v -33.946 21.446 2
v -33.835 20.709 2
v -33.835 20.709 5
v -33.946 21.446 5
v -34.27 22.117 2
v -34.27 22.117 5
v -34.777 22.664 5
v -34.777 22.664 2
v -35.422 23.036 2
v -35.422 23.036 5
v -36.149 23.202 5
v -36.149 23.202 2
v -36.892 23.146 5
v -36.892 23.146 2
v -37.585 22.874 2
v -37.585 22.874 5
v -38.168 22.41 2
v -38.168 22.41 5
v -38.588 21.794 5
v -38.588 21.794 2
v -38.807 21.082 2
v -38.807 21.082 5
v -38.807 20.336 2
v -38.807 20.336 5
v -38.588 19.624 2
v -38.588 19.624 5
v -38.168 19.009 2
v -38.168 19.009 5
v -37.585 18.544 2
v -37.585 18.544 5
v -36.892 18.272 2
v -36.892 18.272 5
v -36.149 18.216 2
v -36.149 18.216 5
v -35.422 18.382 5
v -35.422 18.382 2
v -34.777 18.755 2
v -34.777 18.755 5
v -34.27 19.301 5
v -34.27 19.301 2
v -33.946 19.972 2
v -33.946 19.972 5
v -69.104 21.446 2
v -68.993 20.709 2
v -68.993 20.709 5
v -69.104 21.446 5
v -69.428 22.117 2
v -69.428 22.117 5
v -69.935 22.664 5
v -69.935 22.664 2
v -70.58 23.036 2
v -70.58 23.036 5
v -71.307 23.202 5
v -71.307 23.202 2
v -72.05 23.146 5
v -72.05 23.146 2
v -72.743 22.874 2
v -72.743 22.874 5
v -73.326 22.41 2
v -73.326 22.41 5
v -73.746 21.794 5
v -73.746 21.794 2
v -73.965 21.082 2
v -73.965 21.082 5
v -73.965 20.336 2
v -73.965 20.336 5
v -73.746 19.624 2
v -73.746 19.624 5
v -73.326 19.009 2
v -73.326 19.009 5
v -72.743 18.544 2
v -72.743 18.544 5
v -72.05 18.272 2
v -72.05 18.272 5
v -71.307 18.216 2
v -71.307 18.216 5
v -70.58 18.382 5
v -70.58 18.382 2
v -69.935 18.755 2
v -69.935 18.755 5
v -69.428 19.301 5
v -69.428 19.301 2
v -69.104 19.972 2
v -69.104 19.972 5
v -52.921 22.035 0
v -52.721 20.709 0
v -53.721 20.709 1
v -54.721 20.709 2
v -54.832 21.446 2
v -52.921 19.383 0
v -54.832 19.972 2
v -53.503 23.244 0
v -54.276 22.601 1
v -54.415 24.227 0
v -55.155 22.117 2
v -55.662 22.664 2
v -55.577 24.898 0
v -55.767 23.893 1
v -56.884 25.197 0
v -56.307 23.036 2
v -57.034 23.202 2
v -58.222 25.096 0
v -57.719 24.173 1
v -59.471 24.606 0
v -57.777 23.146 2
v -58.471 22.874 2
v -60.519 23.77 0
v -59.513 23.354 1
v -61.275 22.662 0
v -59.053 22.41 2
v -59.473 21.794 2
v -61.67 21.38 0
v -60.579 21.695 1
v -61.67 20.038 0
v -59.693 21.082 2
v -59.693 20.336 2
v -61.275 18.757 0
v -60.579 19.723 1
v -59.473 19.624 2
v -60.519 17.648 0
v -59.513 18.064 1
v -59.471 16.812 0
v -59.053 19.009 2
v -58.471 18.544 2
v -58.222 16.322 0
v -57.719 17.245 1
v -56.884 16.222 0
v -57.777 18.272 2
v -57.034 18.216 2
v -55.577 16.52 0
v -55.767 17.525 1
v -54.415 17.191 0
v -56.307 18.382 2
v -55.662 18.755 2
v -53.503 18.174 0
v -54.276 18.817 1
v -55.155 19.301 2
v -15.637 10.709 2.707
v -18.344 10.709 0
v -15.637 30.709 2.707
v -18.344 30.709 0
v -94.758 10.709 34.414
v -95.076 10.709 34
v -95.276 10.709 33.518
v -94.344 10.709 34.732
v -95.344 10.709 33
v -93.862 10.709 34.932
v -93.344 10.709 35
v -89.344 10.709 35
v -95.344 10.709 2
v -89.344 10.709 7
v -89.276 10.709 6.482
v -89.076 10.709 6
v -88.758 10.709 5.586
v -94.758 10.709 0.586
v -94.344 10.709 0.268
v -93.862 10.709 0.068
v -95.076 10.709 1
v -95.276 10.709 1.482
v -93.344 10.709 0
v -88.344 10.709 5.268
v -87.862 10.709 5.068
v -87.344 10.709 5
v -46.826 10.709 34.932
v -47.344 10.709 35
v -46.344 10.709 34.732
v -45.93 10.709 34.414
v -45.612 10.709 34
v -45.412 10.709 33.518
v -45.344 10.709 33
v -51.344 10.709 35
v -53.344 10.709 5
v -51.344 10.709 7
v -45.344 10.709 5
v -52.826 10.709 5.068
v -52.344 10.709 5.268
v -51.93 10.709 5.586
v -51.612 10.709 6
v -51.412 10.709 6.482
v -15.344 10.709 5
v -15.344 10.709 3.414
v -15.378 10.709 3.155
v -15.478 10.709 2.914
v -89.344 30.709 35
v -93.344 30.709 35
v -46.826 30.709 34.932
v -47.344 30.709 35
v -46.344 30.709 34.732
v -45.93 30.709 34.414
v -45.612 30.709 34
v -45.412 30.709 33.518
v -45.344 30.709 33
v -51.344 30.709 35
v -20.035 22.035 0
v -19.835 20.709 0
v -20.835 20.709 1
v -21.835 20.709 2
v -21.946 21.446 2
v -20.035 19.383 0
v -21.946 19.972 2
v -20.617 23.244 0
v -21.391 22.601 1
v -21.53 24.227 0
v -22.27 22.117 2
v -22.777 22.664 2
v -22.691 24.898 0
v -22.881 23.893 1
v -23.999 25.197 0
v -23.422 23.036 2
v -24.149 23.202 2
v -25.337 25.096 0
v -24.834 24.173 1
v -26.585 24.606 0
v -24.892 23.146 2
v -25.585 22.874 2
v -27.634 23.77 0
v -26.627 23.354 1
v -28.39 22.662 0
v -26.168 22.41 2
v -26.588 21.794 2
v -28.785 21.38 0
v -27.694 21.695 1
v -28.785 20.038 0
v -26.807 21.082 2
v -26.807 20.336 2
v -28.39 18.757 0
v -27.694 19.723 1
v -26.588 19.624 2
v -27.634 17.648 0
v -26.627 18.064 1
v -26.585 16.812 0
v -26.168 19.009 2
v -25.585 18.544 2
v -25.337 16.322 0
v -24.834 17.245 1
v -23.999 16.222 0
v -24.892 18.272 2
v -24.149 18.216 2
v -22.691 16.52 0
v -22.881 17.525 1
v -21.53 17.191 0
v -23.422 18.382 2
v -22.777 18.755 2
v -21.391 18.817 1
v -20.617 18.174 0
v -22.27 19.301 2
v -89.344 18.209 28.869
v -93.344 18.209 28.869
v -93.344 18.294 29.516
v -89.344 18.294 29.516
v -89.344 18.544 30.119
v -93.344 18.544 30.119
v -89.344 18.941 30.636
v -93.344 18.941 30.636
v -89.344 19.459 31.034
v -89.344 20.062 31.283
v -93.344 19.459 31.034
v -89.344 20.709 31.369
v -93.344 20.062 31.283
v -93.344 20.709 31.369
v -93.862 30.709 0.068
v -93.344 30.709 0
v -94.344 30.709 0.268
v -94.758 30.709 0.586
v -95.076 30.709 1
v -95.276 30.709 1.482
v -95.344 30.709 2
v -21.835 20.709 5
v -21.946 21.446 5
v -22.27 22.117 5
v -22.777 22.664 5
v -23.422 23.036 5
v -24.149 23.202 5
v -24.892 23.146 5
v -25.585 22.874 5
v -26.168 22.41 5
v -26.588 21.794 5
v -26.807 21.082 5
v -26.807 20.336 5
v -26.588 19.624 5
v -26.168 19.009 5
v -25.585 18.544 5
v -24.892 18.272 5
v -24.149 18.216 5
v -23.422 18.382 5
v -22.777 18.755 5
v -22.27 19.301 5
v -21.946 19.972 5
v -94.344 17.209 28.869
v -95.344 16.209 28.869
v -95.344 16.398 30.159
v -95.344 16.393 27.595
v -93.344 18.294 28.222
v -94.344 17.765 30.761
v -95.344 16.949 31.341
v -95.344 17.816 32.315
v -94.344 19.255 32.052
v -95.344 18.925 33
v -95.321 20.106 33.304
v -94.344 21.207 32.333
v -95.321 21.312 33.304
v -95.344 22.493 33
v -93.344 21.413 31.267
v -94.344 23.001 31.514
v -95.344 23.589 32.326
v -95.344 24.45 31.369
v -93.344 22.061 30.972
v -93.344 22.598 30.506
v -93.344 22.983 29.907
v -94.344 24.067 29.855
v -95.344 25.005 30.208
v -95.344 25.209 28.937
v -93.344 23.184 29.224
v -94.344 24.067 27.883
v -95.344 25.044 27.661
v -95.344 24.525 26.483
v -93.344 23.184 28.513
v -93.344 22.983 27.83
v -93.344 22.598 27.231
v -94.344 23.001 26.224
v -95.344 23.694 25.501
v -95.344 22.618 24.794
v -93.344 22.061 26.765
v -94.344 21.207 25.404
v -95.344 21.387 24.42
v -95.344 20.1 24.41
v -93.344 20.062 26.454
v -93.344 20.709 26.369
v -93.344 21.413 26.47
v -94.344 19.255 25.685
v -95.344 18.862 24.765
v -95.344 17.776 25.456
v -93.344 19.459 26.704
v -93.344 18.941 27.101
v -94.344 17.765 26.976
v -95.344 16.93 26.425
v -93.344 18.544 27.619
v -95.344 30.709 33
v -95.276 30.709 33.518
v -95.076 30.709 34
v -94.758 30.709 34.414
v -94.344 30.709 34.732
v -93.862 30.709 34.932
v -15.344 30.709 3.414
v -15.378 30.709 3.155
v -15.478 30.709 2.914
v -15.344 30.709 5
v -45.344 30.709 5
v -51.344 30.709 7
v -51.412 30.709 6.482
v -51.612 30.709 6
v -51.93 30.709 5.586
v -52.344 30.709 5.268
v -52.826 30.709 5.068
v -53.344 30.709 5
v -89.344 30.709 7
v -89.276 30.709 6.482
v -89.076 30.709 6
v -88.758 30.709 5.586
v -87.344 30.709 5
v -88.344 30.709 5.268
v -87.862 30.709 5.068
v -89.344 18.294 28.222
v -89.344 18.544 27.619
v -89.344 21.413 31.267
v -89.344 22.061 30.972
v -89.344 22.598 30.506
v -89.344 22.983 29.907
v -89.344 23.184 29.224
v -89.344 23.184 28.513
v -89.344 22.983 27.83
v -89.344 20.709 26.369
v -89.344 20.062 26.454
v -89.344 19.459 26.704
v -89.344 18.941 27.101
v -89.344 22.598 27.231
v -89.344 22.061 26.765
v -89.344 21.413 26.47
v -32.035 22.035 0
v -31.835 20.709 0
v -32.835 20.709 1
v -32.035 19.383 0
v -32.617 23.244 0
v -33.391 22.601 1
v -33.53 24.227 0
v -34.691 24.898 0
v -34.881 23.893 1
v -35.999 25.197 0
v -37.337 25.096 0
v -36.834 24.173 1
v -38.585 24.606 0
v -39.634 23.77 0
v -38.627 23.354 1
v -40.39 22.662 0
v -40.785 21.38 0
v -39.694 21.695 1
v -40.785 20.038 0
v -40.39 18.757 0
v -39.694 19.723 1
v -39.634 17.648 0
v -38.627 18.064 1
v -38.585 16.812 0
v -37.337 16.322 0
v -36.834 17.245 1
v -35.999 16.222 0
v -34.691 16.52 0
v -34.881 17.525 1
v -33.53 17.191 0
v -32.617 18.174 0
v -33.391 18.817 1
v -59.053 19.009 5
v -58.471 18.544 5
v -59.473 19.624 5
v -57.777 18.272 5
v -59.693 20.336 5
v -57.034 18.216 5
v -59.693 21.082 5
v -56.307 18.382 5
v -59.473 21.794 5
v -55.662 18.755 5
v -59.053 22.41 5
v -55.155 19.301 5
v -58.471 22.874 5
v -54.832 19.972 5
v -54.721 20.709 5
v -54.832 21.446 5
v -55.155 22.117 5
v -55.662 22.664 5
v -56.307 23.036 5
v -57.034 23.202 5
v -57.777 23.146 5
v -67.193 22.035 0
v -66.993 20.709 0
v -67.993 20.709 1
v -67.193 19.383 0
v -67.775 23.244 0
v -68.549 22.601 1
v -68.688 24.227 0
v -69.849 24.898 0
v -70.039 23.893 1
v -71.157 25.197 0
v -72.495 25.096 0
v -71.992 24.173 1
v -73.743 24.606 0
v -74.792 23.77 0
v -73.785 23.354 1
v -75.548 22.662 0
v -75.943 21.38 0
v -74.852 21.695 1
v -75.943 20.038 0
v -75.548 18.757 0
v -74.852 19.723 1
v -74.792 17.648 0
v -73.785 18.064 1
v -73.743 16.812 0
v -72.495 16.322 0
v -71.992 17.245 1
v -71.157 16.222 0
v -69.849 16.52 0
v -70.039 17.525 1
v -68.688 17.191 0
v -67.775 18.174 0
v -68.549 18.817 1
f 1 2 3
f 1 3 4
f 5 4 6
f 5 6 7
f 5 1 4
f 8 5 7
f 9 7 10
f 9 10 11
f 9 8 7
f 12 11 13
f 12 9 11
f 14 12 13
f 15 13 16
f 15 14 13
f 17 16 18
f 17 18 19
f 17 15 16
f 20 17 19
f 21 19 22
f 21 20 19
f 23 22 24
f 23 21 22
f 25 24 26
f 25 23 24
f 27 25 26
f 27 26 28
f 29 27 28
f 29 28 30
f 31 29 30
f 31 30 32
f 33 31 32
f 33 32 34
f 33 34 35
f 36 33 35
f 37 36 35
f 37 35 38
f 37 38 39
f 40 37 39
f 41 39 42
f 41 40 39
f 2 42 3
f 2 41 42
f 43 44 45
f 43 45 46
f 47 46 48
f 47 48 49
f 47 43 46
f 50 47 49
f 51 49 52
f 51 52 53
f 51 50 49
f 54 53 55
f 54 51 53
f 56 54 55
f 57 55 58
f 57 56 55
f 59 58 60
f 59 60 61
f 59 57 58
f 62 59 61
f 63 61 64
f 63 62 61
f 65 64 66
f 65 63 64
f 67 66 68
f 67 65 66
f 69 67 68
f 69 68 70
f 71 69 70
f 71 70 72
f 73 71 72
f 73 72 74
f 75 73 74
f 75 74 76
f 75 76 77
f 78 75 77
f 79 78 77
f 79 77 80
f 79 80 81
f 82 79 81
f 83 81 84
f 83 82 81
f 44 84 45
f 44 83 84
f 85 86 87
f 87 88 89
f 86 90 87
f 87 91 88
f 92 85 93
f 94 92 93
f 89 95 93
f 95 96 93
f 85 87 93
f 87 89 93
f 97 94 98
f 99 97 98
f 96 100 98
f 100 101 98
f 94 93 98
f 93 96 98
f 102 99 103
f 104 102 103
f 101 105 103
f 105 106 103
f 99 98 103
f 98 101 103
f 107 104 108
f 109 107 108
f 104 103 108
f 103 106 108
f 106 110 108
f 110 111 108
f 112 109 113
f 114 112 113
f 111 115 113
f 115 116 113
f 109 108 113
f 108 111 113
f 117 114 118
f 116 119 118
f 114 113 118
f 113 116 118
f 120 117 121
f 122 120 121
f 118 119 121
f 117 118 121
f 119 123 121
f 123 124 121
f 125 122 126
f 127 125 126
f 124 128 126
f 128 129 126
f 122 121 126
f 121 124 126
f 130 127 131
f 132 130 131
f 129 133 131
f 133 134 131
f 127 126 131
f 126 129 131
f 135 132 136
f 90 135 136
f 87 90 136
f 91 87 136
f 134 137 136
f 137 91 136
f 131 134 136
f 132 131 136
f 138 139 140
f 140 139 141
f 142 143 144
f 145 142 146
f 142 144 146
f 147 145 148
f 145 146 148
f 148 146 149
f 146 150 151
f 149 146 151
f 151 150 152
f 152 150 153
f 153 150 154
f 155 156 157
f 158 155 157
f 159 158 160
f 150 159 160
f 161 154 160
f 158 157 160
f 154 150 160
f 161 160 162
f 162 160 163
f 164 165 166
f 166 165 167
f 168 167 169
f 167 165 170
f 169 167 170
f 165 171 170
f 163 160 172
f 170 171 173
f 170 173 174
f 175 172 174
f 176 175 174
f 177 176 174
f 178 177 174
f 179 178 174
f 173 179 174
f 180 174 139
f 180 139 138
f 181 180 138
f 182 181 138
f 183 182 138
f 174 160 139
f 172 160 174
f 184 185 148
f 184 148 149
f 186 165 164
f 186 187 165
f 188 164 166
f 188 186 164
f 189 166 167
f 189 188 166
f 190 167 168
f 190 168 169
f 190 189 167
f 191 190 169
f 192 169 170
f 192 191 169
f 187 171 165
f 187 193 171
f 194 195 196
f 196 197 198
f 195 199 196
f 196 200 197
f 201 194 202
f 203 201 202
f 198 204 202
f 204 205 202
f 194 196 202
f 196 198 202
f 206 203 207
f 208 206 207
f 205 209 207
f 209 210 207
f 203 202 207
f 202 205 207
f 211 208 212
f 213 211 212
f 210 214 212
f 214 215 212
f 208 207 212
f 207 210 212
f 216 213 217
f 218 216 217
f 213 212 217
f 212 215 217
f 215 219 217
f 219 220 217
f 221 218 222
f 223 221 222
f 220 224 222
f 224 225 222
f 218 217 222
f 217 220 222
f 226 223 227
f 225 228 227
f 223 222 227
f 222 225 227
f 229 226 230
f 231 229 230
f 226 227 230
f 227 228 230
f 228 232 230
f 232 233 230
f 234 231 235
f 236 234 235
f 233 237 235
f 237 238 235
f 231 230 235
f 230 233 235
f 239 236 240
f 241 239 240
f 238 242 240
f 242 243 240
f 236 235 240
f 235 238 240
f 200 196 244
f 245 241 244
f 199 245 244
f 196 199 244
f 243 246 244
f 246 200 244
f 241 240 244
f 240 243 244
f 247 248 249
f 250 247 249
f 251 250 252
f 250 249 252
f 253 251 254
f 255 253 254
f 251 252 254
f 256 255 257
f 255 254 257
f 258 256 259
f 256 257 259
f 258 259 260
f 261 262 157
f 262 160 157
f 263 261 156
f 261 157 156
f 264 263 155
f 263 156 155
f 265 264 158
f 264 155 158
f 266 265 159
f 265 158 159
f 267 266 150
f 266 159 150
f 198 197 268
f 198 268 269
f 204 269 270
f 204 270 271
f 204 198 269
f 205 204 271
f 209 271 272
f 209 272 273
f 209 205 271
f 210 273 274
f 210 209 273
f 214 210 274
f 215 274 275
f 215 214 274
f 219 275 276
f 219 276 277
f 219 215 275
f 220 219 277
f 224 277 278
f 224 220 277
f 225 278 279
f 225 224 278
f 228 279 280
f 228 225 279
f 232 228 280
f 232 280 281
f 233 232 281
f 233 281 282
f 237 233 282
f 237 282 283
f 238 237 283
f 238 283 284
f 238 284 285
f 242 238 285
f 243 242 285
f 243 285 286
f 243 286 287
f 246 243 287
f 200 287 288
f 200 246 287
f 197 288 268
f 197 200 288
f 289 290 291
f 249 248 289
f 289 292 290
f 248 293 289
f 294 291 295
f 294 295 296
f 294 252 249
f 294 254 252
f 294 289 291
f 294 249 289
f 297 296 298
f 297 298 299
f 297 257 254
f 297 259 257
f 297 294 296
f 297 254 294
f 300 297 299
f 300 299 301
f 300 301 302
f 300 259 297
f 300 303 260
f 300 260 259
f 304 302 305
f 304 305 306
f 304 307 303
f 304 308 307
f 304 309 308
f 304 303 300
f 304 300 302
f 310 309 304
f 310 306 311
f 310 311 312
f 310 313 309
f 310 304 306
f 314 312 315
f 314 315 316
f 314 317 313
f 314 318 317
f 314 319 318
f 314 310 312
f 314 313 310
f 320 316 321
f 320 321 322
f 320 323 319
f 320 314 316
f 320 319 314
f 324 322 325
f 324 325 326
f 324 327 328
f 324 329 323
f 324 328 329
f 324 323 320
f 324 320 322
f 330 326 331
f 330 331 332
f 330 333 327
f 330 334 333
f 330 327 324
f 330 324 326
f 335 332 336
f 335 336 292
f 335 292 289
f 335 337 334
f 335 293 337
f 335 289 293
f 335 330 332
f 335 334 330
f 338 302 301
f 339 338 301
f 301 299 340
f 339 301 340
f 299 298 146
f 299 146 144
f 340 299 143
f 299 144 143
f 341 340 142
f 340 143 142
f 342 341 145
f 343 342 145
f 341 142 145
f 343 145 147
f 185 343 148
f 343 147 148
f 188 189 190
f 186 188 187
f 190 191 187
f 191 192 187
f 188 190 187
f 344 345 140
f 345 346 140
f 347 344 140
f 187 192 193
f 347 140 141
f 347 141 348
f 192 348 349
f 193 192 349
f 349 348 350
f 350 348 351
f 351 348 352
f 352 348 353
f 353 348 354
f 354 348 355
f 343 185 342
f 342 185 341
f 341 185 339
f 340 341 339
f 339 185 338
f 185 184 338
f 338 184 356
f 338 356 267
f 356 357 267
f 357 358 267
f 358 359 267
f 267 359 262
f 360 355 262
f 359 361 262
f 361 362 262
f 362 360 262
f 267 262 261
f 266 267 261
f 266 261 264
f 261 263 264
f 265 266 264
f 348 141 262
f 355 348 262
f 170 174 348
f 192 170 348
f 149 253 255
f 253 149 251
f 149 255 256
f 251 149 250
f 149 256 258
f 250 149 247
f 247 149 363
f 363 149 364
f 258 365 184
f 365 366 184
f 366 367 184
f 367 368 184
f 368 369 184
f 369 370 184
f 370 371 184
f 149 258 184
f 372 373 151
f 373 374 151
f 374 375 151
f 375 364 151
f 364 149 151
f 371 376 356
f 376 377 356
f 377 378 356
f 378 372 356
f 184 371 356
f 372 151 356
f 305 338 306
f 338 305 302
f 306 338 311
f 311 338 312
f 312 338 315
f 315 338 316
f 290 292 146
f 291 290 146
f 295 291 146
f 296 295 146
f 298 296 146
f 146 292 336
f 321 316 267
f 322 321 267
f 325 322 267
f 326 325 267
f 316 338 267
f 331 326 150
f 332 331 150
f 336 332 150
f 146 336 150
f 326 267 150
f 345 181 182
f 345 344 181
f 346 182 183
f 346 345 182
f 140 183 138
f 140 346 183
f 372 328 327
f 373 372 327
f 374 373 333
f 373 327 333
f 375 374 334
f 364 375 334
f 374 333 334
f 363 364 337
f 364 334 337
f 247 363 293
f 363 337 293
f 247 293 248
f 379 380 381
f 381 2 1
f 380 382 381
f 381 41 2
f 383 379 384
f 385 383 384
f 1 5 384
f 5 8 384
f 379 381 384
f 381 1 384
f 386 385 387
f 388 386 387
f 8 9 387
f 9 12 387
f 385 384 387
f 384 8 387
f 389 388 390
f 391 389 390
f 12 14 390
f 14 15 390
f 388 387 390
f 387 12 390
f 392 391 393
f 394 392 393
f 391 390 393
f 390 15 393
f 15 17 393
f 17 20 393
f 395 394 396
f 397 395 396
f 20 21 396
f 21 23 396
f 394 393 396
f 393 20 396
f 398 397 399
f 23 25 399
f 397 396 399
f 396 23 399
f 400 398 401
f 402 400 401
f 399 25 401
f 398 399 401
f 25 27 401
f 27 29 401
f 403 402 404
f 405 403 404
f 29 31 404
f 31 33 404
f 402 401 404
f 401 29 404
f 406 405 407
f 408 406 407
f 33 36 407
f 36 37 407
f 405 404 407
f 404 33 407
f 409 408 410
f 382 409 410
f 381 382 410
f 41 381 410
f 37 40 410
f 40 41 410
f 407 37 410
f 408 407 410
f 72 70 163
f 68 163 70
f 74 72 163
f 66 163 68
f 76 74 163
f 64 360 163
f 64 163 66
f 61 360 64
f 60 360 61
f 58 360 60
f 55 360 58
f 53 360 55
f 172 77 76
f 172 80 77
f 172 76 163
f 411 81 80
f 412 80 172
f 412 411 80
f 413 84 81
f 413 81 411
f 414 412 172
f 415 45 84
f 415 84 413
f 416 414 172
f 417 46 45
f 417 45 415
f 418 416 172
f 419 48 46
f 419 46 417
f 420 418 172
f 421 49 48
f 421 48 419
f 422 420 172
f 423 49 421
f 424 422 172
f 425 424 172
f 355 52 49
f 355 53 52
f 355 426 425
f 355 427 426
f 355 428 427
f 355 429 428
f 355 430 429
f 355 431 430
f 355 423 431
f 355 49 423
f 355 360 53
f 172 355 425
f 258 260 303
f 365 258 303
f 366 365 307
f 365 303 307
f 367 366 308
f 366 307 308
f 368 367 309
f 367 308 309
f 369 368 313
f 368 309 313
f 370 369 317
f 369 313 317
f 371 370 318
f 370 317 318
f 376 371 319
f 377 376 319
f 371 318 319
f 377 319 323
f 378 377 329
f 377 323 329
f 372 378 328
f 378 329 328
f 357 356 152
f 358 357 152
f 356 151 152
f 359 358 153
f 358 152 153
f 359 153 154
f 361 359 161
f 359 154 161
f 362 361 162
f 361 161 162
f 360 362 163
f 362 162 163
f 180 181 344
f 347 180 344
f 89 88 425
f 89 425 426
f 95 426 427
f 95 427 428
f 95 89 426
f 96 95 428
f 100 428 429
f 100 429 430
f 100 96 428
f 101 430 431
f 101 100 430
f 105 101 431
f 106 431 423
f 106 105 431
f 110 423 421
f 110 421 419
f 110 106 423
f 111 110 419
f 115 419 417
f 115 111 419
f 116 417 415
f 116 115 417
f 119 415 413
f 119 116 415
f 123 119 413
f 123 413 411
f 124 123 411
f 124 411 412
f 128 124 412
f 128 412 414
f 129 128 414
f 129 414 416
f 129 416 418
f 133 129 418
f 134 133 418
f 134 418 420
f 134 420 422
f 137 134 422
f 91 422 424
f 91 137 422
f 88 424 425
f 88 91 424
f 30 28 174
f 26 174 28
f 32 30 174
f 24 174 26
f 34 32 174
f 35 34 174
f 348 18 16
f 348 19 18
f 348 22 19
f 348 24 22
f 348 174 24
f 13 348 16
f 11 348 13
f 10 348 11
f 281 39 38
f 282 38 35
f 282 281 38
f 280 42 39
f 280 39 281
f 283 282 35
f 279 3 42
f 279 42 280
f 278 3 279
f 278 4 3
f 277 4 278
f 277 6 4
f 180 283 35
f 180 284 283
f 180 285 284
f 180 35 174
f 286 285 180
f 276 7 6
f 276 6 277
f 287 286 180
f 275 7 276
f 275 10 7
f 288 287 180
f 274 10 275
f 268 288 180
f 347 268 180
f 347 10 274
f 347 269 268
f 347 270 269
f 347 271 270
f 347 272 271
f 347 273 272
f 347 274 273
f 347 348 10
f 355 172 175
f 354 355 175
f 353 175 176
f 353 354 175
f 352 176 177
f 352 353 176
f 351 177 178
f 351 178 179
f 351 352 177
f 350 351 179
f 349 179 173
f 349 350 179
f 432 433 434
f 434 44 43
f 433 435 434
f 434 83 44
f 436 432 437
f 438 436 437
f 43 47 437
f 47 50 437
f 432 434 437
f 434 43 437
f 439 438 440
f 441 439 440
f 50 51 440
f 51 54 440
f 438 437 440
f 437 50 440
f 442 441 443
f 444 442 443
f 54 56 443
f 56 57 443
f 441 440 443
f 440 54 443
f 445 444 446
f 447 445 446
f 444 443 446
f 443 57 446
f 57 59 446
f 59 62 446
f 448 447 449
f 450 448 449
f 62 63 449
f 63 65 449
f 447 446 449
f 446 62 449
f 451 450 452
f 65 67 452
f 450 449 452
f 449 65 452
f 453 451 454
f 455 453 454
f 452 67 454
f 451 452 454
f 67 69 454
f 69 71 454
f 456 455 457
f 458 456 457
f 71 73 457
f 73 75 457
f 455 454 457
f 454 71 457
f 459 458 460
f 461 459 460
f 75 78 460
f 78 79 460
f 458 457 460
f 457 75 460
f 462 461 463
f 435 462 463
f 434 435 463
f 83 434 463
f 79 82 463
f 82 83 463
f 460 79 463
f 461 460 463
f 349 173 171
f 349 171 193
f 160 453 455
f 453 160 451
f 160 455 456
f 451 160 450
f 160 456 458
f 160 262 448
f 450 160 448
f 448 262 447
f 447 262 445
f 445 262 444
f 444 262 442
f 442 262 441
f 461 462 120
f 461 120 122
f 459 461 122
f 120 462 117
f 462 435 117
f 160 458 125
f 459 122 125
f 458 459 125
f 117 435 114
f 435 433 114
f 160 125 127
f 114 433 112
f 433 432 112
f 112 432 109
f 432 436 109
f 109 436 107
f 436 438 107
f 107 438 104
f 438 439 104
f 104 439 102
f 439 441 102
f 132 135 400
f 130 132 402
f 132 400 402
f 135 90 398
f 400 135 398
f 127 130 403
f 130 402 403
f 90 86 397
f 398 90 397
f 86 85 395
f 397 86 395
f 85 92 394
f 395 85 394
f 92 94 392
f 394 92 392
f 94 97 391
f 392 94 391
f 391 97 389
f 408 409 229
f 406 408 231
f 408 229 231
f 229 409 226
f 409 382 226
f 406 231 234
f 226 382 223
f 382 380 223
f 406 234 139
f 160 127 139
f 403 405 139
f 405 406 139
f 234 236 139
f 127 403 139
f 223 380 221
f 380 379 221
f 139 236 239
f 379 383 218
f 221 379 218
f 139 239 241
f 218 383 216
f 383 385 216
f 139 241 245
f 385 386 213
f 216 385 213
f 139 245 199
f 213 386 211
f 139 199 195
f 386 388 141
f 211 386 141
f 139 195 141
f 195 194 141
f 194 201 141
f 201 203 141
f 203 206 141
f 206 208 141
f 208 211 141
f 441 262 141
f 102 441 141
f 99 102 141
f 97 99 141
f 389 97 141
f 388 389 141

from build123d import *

# Parameters (mm, degrees)
F1_DEPTH = 35
F0_W     = 6
F0_H     = 20
F0_R     = 2.5
F0_W_2   = 30
F2_DEPTH = 5
F3_R     = 2
F4_SIZE  = 3
F5_R     = 1
F6_SIZE  = 2
F7_R     = 2
F9_DEPTH = 12.5


# Not quite as in the source:
# - a fillet or chamfer that OpenCascade refuses, or shapes differently, is made with other operations: its cross-section is extruded or revolved along the edge and cut away or added
# - a feature names something its author has since deleted; it is built from what else it names


with BuildPart() as f1:
    # F0 (on Top) → F1 (new body)
    with BuildSketch(Plane.XY):
        Polygon((-89.3438757165, 20.7090974661), (-89.3438757165, 30.7090974661), (-95.3438757165, 30.7090974661), (-95.3438757165, 10.7090974661), (-89.3438757165, 10.7090974661), align=None)
    extrude(amount=F1_DEPTH)



with BuildPart() as f1b:
    # F0 (on Top) → F1, piece 2 (new body)
    with BuildSketch(Plane.XY):
        with Locations((-48.3438757165, 20.7090974661)):
            Rectangle(F0_W, F0_H)
    extrude(amount=F1_DEPTH)


with BuildPart() as f1_1:
    add(f1.part)

    add(f1b.part)  # F2 merges F1b
    # F0 (on Top) → F2 (join)
    with BuildSketch(Plane.XY):
        Polygon((-51.3438757165, 30.7090974661), (-89.3438757165, 30.7090974661), (-89.3438757165, 20.7090974661), (-89.3438757165, 10.7090974661), (-51.3438757165, 10.7090974661), align=None)
        with Locations((-71.4934170246, 20.7090974661)):
            Circle(F0_R, mode=Mode.SUBTRACT)
        with Locations((-57.2206377983, 20.7090974661)):
            Circle(F0_R, mode=Mode.SUBTRACT)
        with Locations((-30.3438757165, 20.7090974661)):
            Rectangle(F0_W_2, F0_H)
        with Locations((-36.3354164958, 20.7090974661)):
            Circle(F0_R, mode=Mode.SUBTRACT)
        with Locations((-24.3354164958, 20.7090974661)):
            Circle(F0_R, mode=Mode.SUBTRACT)
    extrude(amount=F2_DEPTH)

    # F3
    f3_edges = [f1_1.edges().sort_by_distance(p)[0] for p in [
        (-89.343876, 20.709097, 5),
        (-51.343876, 20.709097, 5),
        (-45.343876, 20.709097, 35),
    ]]
    fillet(f3_edges, radius=F3_R)

    # F4
    f4_edges = [f1_1.edges().sort_by_distance(p)[0] for p in [
        (-15.343876, 20.709097, 0),
    ]]
    chamfer(f4_edges, length=F4_SIZE)

    # F5
    f5_edges = [f1_1.edges().sort_by_distance(p)[0] for p in [
        (-15.343876, 20.709097, 3),
    ]]
    fillet(f5_edges, radius=F5_R)

    # F6
    f6_edges = [f1_1.edges().sort_by_distance(p)[0] for p in [
        (-59.720638, 20.709097, 0),
        (-38.835416, 20.709097, 0),
        (-26.835416, 20.709097, 0),
        (-73.993417, 20.709097, 0),
    ]]
    chamfer(f6_edges, length=F6_SIZE)

    # F7
    f7_edges = [f1_1.edges().sort_by_distance(p)[0] for p in [
        (-95.343876, 20.709097, 35),
        (-95.343876, 20.709097, 0),
    ]]
    fillet(f7_edges, radius=F7_R)

    # F8 (on face) → F9 (cut, symmetric)
    with BuildSketch(Plane(origin=(-95.3438757165, 0, 0), x_dir=(0, -1, 0), z_dir=(-1, 0, 0))):
        with BuildLine():
            ThreePointArc((-18.2090974661, 28.8686309451), (-18.9413305132, 30.636397898), (-20.7090974661, 31.3686309451))
            Line((-20.7090974661, 31.3686309451), (-20.7090974661, 26.3686309451))
            ThreePointArc((-20.7090974661, 26.3686309451), (-18.9413305132, 27.1008639921), (-18.2090974661, 28.8686309451))
        make_face()
        with BuildLine():
            Line((-20.7090974661, 26.3686309451), (-20.7090974661, 31.3686309451))
            ThreePointArc((-20.7090974661, 31.3686309451), (-23.2090974661, 28.8686309451), (-20.7090974661, 26.3686309451))
        make_face()
    extrude(amount=F9_DEPTH, both=True, mode=Mode.SUBTRACT)

    # F10: chamfer of 2 on 1 edges, made by hand

    # F10_s1 → F10_t2 (revolve, cut)
    with BuildSketch(Plane.XY.offset(28.8686309451)):
        Polygon((-95.3438757165, 16.2090974661), (-93.3438757165, 18.2090974661), (-95.3438757165, 18.2090974661), align=None)
    revolve(axis=Axis((-95.3438757165, 20.7090974661, 28.8686309451), (-1, 0, 0)), mode=Mode.SUBTRACT)


solid = f1_1.part
